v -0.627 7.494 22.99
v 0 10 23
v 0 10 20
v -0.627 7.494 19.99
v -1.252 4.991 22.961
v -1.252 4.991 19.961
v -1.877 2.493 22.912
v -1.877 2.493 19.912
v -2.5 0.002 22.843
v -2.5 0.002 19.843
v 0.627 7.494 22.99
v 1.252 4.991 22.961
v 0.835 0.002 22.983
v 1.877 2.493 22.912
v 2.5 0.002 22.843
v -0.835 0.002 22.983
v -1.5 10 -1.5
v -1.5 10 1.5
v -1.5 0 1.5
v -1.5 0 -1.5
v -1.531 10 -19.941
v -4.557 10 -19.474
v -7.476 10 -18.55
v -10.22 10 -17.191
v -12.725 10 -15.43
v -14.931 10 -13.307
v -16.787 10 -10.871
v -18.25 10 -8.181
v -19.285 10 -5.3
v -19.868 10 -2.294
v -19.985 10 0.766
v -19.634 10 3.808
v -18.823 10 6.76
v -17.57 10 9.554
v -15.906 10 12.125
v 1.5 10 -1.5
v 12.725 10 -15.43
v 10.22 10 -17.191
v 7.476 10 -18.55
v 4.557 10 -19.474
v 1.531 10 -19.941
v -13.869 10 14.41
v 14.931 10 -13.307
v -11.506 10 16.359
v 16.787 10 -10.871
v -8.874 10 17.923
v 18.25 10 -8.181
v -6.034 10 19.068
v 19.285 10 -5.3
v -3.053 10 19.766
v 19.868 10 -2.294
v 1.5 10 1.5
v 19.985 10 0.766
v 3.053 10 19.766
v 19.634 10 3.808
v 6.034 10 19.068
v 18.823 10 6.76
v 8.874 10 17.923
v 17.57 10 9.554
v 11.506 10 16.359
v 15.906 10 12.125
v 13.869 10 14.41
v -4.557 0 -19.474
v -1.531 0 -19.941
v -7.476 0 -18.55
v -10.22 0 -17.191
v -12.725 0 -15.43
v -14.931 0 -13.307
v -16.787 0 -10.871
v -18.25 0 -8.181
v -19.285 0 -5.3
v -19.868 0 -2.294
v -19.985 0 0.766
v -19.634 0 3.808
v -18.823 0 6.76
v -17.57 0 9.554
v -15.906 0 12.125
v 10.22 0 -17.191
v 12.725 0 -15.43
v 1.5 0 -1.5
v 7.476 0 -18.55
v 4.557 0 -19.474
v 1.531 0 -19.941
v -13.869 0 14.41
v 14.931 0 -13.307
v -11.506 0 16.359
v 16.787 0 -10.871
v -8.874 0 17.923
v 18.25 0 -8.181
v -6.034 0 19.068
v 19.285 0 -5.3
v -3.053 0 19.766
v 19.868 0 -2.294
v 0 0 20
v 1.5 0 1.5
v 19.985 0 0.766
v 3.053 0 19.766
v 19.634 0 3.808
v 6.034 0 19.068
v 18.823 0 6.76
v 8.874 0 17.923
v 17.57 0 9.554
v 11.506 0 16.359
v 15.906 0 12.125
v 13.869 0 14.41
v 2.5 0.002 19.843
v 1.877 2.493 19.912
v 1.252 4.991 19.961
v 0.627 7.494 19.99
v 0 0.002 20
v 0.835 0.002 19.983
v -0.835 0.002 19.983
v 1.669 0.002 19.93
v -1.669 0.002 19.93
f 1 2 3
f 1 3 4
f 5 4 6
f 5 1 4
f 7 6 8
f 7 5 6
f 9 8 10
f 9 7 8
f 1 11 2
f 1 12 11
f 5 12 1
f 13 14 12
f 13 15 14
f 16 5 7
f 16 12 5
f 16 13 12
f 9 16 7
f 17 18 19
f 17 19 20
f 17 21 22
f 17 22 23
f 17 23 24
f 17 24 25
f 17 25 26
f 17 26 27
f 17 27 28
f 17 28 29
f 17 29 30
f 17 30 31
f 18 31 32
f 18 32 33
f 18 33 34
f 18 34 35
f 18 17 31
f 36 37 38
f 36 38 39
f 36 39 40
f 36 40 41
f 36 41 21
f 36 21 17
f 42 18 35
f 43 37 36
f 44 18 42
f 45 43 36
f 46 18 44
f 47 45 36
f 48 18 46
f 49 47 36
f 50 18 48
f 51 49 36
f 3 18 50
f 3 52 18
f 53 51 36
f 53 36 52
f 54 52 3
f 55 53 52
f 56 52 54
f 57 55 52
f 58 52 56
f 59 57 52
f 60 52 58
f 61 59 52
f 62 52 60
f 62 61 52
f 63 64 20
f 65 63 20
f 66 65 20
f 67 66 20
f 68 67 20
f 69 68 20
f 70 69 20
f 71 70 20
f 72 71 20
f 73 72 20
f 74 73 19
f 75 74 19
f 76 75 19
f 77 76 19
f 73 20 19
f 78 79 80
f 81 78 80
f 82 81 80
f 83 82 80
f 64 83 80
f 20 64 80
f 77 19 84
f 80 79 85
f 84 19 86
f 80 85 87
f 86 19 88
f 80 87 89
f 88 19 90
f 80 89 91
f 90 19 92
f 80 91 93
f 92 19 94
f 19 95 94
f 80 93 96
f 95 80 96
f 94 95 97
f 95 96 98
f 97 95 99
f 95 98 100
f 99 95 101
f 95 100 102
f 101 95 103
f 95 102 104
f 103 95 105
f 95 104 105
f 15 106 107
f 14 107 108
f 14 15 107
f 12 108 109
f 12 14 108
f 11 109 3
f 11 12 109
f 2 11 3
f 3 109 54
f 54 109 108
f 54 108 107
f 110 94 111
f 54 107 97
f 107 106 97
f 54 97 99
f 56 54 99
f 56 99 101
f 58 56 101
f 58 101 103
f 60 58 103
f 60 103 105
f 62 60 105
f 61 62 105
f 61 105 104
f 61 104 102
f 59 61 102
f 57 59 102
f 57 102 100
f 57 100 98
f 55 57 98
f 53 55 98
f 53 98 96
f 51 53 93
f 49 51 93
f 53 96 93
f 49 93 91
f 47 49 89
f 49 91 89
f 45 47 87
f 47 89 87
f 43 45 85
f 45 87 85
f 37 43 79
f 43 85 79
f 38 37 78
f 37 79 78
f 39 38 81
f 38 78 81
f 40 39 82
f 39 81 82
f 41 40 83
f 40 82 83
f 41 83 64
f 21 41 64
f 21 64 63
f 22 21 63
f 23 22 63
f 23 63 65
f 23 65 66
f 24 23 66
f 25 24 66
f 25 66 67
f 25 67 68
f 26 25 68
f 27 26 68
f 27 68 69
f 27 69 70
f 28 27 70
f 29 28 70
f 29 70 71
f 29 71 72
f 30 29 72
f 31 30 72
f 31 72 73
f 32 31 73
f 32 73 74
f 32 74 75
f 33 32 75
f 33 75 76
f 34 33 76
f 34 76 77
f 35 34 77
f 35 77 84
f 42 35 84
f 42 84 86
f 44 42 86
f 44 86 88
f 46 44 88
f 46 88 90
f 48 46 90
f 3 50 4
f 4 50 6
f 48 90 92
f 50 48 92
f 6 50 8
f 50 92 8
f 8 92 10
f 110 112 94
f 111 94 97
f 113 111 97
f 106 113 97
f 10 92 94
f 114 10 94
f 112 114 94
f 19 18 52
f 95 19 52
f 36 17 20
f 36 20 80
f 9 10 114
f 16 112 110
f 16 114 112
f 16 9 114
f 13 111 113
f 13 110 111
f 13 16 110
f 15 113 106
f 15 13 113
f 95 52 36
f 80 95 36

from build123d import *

# Parameters (mm, degrees)
SKETCH1_R                  = 20
SKETCH1_W                  = 3
SKETCH1_H                  = 3
BOSS_EXTRUDE1_DEPTH        = 10
BOSS_EXTRUDE2_REACH        = 35
BOSS_EXTRUDE2_START_RADIUS = 20
BOSS_EXTRUDE2_END_RADIUS   = 20


with BuildPart() as part:
    # Sketch1 → Boss-Extrude1 (new body)
    with BuildSketch(Plane(origin=(0, 0, 0), x_dir=(1, 0, 0), z_dir=(0, 1, 0))):
        with Locations(Location((0, 0, 0), (0, 0, 270))):
            Circle(SKETCH1_R)
        Rectangle(SKETCH1_W, SKETCH1_H, mode=Mode.SUBTRACT)
    extrude(amount=BOSS_EXTRUDE1_DEPTH)

    # Boss-Extrude2: from a cylinder face, 35 long prism both ways, kept between that surface and its translate by the depth
    boss_extrude2_start = Plane(origin=(0, 3.334512, 0), z_dir=(0, -1, 0)) * Cylinder(BOSS_EXTRUDE2_START_RADIUS, 111, mode=Mode.PRIVATE)
    boss_extrude2_end = Plane(origin=(0, 3.334512, 3), z_dir=(0, -1, 0)) * Cylinder(BOSS_EXTRUDE2_END_RADIUS, 111, mode=Mode.PRIVATE)
    # Sketch2 → Boss-Extrude2 (add, from a surface)
    with BuildSketch(Plane.XY, mode=Mode.PRIVATE) as boss_extrude2_sk1:
        Polygon((0, 10), (-2.5, 0.001767652), (2.5, 0.001767652), align=None)
    boss_extrude2_tool1 = extrude(boss_extrude2_sk1.sketch, amount=BOSS_EXTRUDE2_REACH, both=True, mode=Mode.PRIVATE)
    add(((boss_extrude2_tool1 - boss_extrude2_start) & boss_extrude2_end).solids().sort_by_distance((0, 3.334512, 21.421567))[0])


solid = part.part
